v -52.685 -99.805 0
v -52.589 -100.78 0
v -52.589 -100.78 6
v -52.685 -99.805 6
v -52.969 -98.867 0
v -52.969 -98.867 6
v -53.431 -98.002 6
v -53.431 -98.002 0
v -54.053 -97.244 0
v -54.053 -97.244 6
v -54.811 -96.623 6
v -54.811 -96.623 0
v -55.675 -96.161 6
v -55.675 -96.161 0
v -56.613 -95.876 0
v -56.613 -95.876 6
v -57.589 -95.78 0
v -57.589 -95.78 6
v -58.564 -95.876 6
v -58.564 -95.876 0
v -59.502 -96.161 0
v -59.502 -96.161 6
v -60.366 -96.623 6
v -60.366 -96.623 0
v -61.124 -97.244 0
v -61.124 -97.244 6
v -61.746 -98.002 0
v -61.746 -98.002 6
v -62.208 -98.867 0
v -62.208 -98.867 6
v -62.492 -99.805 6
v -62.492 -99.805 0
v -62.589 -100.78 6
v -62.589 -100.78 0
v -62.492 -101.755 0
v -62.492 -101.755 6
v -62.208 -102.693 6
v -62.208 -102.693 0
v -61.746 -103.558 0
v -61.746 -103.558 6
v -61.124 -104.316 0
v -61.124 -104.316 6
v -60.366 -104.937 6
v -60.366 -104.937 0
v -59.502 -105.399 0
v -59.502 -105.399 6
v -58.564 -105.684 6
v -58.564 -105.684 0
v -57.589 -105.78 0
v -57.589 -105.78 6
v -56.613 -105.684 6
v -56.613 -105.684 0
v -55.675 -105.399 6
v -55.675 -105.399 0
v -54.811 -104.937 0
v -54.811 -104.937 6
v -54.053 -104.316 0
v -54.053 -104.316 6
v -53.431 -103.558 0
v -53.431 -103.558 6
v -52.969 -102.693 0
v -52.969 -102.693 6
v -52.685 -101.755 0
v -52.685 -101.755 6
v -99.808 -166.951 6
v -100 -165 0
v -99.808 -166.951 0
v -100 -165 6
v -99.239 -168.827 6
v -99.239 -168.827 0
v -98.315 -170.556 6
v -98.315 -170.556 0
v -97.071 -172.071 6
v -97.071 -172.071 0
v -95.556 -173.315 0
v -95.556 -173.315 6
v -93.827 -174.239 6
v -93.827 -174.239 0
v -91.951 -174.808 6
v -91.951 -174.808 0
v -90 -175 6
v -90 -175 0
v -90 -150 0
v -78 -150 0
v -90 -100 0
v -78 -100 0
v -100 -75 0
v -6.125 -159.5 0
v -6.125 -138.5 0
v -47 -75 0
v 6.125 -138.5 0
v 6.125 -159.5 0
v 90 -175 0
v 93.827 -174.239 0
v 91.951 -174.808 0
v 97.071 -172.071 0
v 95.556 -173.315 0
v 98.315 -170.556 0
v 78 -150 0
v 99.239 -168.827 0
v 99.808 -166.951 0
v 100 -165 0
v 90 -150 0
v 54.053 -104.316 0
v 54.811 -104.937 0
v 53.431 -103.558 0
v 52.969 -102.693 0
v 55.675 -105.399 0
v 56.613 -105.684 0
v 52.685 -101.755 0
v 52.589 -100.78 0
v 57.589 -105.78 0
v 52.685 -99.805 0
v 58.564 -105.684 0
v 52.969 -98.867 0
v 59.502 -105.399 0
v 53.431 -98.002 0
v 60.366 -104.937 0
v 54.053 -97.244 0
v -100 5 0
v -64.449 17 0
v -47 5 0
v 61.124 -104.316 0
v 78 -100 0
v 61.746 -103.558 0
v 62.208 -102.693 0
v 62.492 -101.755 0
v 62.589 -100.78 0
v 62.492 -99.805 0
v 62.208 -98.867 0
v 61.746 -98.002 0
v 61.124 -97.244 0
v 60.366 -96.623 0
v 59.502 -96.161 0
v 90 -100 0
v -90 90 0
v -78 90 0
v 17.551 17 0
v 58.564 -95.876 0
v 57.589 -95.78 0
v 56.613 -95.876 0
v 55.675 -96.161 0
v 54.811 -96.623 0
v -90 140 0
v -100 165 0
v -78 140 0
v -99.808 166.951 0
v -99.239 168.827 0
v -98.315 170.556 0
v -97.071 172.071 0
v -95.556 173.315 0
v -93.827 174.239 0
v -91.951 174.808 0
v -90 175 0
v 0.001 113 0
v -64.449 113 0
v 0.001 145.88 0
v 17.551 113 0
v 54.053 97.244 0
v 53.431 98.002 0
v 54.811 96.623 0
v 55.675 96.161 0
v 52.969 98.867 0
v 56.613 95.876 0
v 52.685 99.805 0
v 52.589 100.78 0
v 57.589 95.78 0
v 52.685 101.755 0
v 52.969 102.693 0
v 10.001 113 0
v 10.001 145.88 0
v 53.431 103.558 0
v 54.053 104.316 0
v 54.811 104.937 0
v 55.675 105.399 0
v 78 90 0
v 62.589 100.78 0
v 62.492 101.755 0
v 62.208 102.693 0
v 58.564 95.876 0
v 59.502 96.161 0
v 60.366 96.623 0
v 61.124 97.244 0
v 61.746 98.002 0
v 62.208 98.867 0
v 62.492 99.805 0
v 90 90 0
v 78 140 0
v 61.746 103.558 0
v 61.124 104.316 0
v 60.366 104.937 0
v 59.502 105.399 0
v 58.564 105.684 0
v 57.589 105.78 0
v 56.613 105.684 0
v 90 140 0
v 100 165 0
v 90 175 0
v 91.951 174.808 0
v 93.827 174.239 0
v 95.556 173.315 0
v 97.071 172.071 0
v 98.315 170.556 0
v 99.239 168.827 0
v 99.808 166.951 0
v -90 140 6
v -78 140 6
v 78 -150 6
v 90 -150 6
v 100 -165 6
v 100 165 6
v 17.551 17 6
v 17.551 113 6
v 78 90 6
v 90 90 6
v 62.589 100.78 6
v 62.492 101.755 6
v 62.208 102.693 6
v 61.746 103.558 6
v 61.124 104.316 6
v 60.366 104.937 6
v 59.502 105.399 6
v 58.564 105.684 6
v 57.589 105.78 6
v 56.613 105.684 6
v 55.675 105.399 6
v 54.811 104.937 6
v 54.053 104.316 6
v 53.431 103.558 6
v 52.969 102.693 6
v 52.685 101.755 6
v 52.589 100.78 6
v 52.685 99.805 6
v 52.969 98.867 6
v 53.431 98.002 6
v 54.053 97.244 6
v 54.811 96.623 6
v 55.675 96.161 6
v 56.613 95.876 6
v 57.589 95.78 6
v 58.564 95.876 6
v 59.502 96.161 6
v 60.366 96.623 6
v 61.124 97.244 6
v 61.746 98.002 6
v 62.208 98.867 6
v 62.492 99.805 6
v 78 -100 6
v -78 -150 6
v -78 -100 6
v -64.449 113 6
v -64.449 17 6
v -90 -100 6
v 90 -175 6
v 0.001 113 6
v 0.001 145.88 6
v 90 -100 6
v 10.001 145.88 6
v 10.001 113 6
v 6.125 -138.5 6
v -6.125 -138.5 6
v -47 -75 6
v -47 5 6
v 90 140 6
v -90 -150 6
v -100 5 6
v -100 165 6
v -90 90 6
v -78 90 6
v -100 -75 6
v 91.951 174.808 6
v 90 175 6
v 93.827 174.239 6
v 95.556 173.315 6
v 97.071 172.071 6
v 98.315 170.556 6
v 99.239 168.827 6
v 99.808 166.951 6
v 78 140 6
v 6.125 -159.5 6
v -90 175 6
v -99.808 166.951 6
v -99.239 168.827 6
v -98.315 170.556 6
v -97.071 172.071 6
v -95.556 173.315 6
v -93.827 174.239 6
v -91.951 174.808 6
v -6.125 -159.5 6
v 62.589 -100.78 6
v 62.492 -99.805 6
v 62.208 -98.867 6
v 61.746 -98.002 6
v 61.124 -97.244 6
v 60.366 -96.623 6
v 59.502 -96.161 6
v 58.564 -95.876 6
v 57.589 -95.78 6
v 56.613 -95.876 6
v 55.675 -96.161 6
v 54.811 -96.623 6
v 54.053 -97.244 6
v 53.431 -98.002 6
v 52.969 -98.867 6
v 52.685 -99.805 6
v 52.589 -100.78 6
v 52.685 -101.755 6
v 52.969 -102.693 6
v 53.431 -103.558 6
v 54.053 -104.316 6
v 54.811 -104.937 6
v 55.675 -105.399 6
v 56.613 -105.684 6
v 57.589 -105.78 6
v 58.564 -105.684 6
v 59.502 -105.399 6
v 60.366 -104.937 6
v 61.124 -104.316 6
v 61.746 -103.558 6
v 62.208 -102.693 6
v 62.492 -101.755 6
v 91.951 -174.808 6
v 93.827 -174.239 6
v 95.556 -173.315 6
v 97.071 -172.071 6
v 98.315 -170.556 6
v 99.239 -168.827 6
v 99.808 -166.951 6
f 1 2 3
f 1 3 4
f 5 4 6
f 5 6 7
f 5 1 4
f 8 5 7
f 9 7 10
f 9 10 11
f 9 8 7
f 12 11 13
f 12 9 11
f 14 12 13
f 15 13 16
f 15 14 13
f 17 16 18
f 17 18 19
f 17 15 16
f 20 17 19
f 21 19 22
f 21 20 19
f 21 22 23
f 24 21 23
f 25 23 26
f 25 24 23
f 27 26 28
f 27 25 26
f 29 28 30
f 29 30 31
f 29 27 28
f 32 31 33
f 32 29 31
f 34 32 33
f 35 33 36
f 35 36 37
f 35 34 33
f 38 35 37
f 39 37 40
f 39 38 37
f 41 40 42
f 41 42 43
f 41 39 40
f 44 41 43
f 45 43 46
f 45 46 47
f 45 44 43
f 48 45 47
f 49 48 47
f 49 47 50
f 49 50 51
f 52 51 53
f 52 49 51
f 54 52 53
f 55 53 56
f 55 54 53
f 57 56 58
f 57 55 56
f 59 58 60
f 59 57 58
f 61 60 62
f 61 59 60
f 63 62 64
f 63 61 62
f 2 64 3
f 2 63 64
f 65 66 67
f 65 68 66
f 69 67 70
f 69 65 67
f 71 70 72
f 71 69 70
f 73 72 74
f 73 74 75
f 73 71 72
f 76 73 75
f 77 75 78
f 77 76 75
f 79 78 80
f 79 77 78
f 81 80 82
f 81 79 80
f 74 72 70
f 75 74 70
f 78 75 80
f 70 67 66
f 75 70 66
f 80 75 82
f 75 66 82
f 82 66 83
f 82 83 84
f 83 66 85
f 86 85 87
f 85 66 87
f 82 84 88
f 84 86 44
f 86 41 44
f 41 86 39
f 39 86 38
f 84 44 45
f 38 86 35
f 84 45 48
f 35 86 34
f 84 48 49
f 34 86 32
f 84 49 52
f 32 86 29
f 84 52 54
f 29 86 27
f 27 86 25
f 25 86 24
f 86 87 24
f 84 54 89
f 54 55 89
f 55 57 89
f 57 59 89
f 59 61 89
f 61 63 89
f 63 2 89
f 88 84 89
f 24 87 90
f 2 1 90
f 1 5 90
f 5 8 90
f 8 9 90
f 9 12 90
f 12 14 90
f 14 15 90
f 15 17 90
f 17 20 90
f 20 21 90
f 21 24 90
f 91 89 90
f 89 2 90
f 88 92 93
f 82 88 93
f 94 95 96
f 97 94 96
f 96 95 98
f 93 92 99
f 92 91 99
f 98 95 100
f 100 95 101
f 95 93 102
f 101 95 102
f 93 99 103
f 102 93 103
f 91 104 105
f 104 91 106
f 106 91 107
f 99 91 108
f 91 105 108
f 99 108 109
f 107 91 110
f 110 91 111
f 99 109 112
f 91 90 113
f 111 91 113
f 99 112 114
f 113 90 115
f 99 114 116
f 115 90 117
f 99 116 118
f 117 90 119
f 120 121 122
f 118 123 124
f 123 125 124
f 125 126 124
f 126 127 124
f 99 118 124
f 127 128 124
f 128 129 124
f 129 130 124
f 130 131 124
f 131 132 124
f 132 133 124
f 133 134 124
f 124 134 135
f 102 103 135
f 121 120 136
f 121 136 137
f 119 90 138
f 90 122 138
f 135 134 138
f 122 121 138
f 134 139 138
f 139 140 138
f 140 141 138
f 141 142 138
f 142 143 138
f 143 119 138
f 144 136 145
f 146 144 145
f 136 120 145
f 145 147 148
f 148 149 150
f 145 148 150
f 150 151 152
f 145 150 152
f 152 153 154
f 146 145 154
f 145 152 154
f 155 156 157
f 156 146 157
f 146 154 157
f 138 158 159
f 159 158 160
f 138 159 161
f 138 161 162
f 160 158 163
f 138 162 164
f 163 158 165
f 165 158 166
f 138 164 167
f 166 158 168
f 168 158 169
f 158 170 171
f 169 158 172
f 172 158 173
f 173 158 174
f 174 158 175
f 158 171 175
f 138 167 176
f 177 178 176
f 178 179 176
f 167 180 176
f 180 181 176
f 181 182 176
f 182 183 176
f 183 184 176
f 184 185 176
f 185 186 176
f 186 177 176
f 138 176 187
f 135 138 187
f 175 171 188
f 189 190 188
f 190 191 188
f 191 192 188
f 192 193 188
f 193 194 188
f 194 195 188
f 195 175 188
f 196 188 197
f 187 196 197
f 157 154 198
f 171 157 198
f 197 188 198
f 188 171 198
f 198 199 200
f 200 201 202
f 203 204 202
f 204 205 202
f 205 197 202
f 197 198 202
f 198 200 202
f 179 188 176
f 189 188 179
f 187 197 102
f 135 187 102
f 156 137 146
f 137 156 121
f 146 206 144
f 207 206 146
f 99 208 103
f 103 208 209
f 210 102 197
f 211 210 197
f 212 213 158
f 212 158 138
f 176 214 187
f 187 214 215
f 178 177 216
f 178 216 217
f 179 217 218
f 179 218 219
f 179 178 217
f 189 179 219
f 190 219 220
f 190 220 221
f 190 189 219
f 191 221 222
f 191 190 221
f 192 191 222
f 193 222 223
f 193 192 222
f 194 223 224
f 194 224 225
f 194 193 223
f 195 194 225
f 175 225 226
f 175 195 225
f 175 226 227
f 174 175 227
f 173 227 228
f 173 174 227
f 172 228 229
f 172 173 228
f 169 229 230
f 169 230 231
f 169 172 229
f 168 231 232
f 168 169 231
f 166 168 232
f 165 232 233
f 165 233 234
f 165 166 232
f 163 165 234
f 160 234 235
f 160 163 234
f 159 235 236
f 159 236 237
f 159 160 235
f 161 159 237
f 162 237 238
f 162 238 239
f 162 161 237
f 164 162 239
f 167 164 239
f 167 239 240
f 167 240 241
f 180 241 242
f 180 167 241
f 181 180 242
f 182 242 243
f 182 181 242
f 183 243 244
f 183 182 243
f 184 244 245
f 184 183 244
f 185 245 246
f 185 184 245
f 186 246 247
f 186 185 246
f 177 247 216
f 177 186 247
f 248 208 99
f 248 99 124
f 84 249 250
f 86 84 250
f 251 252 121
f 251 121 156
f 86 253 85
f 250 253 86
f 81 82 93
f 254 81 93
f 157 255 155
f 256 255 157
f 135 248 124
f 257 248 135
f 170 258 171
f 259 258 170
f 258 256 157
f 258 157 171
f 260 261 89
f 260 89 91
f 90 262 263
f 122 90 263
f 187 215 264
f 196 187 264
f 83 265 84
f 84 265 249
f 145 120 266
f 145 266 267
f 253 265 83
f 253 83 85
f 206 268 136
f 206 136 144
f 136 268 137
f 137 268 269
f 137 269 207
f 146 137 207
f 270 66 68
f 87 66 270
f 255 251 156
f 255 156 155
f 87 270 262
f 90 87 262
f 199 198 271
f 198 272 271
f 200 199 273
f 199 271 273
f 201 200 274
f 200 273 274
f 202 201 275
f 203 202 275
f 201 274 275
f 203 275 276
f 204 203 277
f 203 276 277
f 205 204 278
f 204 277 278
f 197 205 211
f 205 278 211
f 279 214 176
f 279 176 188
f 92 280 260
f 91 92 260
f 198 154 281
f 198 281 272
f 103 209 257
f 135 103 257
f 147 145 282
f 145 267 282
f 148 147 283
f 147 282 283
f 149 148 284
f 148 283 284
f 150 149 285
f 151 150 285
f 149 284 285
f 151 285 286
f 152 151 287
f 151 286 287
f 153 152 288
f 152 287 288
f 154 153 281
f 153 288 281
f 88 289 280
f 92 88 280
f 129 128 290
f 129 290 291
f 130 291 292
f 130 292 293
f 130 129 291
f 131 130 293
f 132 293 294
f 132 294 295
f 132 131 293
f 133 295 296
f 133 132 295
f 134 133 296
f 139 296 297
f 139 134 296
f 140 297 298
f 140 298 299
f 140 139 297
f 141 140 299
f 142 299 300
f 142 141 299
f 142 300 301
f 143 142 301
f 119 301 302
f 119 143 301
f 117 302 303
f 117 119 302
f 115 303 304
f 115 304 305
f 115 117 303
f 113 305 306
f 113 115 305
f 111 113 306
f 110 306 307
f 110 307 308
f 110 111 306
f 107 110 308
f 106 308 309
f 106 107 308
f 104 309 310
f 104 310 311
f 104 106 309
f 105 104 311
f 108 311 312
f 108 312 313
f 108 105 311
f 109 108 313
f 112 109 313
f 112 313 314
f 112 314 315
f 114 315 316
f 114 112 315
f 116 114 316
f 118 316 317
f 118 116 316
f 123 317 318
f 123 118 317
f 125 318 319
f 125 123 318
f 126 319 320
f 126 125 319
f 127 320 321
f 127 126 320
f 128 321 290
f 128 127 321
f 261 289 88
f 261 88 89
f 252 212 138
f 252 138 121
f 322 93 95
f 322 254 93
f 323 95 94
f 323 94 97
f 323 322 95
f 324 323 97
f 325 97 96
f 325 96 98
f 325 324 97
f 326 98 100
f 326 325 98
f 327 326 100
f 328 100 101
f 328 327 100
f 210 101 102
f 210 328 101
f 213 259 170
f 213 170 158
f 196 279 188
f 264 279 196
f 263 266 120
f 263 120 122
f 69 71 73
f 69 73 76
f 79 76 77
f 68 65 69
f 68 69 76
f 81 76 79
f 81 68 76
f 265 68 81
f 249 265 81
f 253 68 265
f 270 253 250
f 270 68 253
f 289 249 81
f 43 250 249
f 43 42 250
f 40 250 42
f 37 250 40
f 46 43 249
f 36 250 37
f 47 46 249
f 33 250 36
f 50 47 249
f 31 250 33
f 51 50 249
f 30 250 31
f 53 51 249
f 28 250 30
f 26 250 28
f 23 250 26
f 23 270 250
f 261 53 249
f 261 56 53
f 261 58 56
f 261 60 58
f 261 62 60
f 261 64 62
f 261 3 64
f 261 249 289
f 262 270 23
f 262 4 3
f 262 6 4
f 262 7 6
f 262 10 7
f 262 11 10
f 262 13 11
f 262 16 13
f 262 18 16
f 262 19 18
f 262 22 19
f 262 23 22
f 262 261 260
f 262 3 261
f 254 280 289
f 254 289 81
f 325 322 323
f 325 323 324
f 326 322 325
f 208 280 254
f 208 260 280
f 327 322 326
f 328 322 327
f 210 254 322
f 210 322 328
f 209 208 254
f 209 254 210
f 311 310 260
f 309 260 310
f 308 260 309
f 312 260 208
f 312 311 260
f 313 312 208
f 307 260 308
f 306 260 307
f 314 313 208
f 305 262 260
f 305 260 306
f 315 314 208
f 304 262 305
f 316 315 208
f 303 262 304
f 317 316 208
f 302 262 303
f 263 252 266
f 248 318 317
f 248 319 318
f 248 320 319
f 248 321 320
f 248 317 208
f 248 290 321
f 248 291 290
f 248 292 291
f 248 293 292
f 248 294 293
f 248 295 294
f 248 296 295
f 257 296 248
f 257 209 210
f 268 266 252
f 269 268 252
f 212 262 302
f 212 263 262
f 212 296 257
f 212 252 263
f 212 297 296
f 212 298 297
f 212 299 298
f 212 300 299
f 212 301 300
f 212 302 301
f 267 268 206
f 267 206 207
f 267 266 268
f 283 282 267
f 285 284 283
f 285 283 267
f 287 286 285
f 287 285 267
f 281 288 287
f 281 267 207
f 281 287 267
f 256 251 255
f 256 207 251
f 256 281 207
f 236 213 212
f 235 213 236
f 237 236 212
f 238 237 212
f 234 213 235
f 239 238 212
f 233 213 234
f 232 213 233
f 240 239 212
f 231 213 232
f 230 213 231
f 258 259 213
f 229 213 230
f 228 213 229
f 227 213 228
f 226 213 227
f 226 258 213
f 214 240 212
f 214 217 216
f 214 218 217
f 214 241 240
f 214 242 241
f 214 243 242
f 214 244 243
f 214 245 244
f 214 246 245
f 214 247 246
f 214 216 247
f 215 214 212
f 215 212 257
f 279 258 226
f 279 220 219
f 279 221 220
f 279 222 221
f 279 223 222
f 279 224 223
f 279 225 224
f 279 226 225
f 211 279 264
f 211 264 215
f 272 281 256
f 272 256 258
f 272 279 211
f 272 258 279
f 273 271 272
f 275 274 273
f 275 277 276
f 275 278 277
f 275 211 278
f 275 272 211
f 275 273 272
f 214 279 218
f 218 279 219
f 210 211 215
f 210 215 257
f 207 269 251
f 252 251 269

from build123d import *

# Parameters (mm, degrees)
SKETCH1_W           = 200
SKETCH1_H           = 350
SKETCH1_R           = 5
BOSS_EXTRUDE1_DEPTH = 6
FILLET1_R           = 10
SKETCH2_W           = 12
SKETCH2_H           = 50
SKETCH2_W_2         = 54
SKETCH2_H_2         = 80
SKETCH2_W_3         = 12.25
SKETCH2_H_3         = 21
CUT_EXTRUDE1_DEPTH  = 7


with BuildPart() as part:
    # Sketch1 → Boss-Extrude1 (new body)
    with BuildSketch(Plane.XY):
        Rectangle(SKETCH1_W, SKETCH1_H)
        with Locations((-57.588571429, 100.78)):
            Circle(SKETCH1_R, mode=Mode.SUBTRACT)
        with Locations((57.588571429, 100.78)):
            Circle(SKETCH1_R, mode=Mode.SUBTRACT)
        with Locations((57.588571429, -100.78)):
            Circle(SKETCH1_R, mode=Mode.SUBTRACT)
        with Locations((-57.588571429, -100.78)):
            Circle(SKETCH1_R, mode=Mode.SUBTRACT)
    extrude(amount=BOSS_EXTRUDE1_DEPTH)

    # Fillet1
    fillet1_edges = [part.edges().sort_by_distance(p)[0] for p in [
        (100, -175, 3),
        (-100, -175, 3),
        (-100, 175, 3),
        (100, 175, 3),
    ]]
    fillet(fillet1_edges, radius=FILLET1_R)

    # Sketch2 → Cut-Extrude1 (cut, through all)
    with BuildSketch(Plane.XY.offset(6)):
        Polygon((10.001494726, 113), (17.551494726, 113), (17.551494726, 17), (-64.448505274, 17), (-64.448505274, 113), (0.001494726, 113), (0.001494726, 145.880160171), (10.001494726, 145.880160171), align=None)
        with Locations((-84, 115)):
            Rectangle(SKETCH2_W, SKETCH2_H)
        with Locations((-84, -125)):
            Rectangle(SKETCH2_W, SKETCH2_H)
        with Locations((84, -125)):
            Rectangle(SKETCH2_W, SKETCH2_H)
        with Locations((84, 115)):
            Rectangle(SKETCH2_W, SKETCH2_H)
        with Locations((-74, -35)):
            Rectangle(SKETCH2_W_2, SKETCH2_H_2)
        with Locations((0, -149)):
            Rectangle(SKETCH2_W_3, SKETCH2_H_3)
    extrude(amount=-CUT_EXTRUDE1_DEPTH, mode=Mode.SUBTRACT)


solid = part.part
